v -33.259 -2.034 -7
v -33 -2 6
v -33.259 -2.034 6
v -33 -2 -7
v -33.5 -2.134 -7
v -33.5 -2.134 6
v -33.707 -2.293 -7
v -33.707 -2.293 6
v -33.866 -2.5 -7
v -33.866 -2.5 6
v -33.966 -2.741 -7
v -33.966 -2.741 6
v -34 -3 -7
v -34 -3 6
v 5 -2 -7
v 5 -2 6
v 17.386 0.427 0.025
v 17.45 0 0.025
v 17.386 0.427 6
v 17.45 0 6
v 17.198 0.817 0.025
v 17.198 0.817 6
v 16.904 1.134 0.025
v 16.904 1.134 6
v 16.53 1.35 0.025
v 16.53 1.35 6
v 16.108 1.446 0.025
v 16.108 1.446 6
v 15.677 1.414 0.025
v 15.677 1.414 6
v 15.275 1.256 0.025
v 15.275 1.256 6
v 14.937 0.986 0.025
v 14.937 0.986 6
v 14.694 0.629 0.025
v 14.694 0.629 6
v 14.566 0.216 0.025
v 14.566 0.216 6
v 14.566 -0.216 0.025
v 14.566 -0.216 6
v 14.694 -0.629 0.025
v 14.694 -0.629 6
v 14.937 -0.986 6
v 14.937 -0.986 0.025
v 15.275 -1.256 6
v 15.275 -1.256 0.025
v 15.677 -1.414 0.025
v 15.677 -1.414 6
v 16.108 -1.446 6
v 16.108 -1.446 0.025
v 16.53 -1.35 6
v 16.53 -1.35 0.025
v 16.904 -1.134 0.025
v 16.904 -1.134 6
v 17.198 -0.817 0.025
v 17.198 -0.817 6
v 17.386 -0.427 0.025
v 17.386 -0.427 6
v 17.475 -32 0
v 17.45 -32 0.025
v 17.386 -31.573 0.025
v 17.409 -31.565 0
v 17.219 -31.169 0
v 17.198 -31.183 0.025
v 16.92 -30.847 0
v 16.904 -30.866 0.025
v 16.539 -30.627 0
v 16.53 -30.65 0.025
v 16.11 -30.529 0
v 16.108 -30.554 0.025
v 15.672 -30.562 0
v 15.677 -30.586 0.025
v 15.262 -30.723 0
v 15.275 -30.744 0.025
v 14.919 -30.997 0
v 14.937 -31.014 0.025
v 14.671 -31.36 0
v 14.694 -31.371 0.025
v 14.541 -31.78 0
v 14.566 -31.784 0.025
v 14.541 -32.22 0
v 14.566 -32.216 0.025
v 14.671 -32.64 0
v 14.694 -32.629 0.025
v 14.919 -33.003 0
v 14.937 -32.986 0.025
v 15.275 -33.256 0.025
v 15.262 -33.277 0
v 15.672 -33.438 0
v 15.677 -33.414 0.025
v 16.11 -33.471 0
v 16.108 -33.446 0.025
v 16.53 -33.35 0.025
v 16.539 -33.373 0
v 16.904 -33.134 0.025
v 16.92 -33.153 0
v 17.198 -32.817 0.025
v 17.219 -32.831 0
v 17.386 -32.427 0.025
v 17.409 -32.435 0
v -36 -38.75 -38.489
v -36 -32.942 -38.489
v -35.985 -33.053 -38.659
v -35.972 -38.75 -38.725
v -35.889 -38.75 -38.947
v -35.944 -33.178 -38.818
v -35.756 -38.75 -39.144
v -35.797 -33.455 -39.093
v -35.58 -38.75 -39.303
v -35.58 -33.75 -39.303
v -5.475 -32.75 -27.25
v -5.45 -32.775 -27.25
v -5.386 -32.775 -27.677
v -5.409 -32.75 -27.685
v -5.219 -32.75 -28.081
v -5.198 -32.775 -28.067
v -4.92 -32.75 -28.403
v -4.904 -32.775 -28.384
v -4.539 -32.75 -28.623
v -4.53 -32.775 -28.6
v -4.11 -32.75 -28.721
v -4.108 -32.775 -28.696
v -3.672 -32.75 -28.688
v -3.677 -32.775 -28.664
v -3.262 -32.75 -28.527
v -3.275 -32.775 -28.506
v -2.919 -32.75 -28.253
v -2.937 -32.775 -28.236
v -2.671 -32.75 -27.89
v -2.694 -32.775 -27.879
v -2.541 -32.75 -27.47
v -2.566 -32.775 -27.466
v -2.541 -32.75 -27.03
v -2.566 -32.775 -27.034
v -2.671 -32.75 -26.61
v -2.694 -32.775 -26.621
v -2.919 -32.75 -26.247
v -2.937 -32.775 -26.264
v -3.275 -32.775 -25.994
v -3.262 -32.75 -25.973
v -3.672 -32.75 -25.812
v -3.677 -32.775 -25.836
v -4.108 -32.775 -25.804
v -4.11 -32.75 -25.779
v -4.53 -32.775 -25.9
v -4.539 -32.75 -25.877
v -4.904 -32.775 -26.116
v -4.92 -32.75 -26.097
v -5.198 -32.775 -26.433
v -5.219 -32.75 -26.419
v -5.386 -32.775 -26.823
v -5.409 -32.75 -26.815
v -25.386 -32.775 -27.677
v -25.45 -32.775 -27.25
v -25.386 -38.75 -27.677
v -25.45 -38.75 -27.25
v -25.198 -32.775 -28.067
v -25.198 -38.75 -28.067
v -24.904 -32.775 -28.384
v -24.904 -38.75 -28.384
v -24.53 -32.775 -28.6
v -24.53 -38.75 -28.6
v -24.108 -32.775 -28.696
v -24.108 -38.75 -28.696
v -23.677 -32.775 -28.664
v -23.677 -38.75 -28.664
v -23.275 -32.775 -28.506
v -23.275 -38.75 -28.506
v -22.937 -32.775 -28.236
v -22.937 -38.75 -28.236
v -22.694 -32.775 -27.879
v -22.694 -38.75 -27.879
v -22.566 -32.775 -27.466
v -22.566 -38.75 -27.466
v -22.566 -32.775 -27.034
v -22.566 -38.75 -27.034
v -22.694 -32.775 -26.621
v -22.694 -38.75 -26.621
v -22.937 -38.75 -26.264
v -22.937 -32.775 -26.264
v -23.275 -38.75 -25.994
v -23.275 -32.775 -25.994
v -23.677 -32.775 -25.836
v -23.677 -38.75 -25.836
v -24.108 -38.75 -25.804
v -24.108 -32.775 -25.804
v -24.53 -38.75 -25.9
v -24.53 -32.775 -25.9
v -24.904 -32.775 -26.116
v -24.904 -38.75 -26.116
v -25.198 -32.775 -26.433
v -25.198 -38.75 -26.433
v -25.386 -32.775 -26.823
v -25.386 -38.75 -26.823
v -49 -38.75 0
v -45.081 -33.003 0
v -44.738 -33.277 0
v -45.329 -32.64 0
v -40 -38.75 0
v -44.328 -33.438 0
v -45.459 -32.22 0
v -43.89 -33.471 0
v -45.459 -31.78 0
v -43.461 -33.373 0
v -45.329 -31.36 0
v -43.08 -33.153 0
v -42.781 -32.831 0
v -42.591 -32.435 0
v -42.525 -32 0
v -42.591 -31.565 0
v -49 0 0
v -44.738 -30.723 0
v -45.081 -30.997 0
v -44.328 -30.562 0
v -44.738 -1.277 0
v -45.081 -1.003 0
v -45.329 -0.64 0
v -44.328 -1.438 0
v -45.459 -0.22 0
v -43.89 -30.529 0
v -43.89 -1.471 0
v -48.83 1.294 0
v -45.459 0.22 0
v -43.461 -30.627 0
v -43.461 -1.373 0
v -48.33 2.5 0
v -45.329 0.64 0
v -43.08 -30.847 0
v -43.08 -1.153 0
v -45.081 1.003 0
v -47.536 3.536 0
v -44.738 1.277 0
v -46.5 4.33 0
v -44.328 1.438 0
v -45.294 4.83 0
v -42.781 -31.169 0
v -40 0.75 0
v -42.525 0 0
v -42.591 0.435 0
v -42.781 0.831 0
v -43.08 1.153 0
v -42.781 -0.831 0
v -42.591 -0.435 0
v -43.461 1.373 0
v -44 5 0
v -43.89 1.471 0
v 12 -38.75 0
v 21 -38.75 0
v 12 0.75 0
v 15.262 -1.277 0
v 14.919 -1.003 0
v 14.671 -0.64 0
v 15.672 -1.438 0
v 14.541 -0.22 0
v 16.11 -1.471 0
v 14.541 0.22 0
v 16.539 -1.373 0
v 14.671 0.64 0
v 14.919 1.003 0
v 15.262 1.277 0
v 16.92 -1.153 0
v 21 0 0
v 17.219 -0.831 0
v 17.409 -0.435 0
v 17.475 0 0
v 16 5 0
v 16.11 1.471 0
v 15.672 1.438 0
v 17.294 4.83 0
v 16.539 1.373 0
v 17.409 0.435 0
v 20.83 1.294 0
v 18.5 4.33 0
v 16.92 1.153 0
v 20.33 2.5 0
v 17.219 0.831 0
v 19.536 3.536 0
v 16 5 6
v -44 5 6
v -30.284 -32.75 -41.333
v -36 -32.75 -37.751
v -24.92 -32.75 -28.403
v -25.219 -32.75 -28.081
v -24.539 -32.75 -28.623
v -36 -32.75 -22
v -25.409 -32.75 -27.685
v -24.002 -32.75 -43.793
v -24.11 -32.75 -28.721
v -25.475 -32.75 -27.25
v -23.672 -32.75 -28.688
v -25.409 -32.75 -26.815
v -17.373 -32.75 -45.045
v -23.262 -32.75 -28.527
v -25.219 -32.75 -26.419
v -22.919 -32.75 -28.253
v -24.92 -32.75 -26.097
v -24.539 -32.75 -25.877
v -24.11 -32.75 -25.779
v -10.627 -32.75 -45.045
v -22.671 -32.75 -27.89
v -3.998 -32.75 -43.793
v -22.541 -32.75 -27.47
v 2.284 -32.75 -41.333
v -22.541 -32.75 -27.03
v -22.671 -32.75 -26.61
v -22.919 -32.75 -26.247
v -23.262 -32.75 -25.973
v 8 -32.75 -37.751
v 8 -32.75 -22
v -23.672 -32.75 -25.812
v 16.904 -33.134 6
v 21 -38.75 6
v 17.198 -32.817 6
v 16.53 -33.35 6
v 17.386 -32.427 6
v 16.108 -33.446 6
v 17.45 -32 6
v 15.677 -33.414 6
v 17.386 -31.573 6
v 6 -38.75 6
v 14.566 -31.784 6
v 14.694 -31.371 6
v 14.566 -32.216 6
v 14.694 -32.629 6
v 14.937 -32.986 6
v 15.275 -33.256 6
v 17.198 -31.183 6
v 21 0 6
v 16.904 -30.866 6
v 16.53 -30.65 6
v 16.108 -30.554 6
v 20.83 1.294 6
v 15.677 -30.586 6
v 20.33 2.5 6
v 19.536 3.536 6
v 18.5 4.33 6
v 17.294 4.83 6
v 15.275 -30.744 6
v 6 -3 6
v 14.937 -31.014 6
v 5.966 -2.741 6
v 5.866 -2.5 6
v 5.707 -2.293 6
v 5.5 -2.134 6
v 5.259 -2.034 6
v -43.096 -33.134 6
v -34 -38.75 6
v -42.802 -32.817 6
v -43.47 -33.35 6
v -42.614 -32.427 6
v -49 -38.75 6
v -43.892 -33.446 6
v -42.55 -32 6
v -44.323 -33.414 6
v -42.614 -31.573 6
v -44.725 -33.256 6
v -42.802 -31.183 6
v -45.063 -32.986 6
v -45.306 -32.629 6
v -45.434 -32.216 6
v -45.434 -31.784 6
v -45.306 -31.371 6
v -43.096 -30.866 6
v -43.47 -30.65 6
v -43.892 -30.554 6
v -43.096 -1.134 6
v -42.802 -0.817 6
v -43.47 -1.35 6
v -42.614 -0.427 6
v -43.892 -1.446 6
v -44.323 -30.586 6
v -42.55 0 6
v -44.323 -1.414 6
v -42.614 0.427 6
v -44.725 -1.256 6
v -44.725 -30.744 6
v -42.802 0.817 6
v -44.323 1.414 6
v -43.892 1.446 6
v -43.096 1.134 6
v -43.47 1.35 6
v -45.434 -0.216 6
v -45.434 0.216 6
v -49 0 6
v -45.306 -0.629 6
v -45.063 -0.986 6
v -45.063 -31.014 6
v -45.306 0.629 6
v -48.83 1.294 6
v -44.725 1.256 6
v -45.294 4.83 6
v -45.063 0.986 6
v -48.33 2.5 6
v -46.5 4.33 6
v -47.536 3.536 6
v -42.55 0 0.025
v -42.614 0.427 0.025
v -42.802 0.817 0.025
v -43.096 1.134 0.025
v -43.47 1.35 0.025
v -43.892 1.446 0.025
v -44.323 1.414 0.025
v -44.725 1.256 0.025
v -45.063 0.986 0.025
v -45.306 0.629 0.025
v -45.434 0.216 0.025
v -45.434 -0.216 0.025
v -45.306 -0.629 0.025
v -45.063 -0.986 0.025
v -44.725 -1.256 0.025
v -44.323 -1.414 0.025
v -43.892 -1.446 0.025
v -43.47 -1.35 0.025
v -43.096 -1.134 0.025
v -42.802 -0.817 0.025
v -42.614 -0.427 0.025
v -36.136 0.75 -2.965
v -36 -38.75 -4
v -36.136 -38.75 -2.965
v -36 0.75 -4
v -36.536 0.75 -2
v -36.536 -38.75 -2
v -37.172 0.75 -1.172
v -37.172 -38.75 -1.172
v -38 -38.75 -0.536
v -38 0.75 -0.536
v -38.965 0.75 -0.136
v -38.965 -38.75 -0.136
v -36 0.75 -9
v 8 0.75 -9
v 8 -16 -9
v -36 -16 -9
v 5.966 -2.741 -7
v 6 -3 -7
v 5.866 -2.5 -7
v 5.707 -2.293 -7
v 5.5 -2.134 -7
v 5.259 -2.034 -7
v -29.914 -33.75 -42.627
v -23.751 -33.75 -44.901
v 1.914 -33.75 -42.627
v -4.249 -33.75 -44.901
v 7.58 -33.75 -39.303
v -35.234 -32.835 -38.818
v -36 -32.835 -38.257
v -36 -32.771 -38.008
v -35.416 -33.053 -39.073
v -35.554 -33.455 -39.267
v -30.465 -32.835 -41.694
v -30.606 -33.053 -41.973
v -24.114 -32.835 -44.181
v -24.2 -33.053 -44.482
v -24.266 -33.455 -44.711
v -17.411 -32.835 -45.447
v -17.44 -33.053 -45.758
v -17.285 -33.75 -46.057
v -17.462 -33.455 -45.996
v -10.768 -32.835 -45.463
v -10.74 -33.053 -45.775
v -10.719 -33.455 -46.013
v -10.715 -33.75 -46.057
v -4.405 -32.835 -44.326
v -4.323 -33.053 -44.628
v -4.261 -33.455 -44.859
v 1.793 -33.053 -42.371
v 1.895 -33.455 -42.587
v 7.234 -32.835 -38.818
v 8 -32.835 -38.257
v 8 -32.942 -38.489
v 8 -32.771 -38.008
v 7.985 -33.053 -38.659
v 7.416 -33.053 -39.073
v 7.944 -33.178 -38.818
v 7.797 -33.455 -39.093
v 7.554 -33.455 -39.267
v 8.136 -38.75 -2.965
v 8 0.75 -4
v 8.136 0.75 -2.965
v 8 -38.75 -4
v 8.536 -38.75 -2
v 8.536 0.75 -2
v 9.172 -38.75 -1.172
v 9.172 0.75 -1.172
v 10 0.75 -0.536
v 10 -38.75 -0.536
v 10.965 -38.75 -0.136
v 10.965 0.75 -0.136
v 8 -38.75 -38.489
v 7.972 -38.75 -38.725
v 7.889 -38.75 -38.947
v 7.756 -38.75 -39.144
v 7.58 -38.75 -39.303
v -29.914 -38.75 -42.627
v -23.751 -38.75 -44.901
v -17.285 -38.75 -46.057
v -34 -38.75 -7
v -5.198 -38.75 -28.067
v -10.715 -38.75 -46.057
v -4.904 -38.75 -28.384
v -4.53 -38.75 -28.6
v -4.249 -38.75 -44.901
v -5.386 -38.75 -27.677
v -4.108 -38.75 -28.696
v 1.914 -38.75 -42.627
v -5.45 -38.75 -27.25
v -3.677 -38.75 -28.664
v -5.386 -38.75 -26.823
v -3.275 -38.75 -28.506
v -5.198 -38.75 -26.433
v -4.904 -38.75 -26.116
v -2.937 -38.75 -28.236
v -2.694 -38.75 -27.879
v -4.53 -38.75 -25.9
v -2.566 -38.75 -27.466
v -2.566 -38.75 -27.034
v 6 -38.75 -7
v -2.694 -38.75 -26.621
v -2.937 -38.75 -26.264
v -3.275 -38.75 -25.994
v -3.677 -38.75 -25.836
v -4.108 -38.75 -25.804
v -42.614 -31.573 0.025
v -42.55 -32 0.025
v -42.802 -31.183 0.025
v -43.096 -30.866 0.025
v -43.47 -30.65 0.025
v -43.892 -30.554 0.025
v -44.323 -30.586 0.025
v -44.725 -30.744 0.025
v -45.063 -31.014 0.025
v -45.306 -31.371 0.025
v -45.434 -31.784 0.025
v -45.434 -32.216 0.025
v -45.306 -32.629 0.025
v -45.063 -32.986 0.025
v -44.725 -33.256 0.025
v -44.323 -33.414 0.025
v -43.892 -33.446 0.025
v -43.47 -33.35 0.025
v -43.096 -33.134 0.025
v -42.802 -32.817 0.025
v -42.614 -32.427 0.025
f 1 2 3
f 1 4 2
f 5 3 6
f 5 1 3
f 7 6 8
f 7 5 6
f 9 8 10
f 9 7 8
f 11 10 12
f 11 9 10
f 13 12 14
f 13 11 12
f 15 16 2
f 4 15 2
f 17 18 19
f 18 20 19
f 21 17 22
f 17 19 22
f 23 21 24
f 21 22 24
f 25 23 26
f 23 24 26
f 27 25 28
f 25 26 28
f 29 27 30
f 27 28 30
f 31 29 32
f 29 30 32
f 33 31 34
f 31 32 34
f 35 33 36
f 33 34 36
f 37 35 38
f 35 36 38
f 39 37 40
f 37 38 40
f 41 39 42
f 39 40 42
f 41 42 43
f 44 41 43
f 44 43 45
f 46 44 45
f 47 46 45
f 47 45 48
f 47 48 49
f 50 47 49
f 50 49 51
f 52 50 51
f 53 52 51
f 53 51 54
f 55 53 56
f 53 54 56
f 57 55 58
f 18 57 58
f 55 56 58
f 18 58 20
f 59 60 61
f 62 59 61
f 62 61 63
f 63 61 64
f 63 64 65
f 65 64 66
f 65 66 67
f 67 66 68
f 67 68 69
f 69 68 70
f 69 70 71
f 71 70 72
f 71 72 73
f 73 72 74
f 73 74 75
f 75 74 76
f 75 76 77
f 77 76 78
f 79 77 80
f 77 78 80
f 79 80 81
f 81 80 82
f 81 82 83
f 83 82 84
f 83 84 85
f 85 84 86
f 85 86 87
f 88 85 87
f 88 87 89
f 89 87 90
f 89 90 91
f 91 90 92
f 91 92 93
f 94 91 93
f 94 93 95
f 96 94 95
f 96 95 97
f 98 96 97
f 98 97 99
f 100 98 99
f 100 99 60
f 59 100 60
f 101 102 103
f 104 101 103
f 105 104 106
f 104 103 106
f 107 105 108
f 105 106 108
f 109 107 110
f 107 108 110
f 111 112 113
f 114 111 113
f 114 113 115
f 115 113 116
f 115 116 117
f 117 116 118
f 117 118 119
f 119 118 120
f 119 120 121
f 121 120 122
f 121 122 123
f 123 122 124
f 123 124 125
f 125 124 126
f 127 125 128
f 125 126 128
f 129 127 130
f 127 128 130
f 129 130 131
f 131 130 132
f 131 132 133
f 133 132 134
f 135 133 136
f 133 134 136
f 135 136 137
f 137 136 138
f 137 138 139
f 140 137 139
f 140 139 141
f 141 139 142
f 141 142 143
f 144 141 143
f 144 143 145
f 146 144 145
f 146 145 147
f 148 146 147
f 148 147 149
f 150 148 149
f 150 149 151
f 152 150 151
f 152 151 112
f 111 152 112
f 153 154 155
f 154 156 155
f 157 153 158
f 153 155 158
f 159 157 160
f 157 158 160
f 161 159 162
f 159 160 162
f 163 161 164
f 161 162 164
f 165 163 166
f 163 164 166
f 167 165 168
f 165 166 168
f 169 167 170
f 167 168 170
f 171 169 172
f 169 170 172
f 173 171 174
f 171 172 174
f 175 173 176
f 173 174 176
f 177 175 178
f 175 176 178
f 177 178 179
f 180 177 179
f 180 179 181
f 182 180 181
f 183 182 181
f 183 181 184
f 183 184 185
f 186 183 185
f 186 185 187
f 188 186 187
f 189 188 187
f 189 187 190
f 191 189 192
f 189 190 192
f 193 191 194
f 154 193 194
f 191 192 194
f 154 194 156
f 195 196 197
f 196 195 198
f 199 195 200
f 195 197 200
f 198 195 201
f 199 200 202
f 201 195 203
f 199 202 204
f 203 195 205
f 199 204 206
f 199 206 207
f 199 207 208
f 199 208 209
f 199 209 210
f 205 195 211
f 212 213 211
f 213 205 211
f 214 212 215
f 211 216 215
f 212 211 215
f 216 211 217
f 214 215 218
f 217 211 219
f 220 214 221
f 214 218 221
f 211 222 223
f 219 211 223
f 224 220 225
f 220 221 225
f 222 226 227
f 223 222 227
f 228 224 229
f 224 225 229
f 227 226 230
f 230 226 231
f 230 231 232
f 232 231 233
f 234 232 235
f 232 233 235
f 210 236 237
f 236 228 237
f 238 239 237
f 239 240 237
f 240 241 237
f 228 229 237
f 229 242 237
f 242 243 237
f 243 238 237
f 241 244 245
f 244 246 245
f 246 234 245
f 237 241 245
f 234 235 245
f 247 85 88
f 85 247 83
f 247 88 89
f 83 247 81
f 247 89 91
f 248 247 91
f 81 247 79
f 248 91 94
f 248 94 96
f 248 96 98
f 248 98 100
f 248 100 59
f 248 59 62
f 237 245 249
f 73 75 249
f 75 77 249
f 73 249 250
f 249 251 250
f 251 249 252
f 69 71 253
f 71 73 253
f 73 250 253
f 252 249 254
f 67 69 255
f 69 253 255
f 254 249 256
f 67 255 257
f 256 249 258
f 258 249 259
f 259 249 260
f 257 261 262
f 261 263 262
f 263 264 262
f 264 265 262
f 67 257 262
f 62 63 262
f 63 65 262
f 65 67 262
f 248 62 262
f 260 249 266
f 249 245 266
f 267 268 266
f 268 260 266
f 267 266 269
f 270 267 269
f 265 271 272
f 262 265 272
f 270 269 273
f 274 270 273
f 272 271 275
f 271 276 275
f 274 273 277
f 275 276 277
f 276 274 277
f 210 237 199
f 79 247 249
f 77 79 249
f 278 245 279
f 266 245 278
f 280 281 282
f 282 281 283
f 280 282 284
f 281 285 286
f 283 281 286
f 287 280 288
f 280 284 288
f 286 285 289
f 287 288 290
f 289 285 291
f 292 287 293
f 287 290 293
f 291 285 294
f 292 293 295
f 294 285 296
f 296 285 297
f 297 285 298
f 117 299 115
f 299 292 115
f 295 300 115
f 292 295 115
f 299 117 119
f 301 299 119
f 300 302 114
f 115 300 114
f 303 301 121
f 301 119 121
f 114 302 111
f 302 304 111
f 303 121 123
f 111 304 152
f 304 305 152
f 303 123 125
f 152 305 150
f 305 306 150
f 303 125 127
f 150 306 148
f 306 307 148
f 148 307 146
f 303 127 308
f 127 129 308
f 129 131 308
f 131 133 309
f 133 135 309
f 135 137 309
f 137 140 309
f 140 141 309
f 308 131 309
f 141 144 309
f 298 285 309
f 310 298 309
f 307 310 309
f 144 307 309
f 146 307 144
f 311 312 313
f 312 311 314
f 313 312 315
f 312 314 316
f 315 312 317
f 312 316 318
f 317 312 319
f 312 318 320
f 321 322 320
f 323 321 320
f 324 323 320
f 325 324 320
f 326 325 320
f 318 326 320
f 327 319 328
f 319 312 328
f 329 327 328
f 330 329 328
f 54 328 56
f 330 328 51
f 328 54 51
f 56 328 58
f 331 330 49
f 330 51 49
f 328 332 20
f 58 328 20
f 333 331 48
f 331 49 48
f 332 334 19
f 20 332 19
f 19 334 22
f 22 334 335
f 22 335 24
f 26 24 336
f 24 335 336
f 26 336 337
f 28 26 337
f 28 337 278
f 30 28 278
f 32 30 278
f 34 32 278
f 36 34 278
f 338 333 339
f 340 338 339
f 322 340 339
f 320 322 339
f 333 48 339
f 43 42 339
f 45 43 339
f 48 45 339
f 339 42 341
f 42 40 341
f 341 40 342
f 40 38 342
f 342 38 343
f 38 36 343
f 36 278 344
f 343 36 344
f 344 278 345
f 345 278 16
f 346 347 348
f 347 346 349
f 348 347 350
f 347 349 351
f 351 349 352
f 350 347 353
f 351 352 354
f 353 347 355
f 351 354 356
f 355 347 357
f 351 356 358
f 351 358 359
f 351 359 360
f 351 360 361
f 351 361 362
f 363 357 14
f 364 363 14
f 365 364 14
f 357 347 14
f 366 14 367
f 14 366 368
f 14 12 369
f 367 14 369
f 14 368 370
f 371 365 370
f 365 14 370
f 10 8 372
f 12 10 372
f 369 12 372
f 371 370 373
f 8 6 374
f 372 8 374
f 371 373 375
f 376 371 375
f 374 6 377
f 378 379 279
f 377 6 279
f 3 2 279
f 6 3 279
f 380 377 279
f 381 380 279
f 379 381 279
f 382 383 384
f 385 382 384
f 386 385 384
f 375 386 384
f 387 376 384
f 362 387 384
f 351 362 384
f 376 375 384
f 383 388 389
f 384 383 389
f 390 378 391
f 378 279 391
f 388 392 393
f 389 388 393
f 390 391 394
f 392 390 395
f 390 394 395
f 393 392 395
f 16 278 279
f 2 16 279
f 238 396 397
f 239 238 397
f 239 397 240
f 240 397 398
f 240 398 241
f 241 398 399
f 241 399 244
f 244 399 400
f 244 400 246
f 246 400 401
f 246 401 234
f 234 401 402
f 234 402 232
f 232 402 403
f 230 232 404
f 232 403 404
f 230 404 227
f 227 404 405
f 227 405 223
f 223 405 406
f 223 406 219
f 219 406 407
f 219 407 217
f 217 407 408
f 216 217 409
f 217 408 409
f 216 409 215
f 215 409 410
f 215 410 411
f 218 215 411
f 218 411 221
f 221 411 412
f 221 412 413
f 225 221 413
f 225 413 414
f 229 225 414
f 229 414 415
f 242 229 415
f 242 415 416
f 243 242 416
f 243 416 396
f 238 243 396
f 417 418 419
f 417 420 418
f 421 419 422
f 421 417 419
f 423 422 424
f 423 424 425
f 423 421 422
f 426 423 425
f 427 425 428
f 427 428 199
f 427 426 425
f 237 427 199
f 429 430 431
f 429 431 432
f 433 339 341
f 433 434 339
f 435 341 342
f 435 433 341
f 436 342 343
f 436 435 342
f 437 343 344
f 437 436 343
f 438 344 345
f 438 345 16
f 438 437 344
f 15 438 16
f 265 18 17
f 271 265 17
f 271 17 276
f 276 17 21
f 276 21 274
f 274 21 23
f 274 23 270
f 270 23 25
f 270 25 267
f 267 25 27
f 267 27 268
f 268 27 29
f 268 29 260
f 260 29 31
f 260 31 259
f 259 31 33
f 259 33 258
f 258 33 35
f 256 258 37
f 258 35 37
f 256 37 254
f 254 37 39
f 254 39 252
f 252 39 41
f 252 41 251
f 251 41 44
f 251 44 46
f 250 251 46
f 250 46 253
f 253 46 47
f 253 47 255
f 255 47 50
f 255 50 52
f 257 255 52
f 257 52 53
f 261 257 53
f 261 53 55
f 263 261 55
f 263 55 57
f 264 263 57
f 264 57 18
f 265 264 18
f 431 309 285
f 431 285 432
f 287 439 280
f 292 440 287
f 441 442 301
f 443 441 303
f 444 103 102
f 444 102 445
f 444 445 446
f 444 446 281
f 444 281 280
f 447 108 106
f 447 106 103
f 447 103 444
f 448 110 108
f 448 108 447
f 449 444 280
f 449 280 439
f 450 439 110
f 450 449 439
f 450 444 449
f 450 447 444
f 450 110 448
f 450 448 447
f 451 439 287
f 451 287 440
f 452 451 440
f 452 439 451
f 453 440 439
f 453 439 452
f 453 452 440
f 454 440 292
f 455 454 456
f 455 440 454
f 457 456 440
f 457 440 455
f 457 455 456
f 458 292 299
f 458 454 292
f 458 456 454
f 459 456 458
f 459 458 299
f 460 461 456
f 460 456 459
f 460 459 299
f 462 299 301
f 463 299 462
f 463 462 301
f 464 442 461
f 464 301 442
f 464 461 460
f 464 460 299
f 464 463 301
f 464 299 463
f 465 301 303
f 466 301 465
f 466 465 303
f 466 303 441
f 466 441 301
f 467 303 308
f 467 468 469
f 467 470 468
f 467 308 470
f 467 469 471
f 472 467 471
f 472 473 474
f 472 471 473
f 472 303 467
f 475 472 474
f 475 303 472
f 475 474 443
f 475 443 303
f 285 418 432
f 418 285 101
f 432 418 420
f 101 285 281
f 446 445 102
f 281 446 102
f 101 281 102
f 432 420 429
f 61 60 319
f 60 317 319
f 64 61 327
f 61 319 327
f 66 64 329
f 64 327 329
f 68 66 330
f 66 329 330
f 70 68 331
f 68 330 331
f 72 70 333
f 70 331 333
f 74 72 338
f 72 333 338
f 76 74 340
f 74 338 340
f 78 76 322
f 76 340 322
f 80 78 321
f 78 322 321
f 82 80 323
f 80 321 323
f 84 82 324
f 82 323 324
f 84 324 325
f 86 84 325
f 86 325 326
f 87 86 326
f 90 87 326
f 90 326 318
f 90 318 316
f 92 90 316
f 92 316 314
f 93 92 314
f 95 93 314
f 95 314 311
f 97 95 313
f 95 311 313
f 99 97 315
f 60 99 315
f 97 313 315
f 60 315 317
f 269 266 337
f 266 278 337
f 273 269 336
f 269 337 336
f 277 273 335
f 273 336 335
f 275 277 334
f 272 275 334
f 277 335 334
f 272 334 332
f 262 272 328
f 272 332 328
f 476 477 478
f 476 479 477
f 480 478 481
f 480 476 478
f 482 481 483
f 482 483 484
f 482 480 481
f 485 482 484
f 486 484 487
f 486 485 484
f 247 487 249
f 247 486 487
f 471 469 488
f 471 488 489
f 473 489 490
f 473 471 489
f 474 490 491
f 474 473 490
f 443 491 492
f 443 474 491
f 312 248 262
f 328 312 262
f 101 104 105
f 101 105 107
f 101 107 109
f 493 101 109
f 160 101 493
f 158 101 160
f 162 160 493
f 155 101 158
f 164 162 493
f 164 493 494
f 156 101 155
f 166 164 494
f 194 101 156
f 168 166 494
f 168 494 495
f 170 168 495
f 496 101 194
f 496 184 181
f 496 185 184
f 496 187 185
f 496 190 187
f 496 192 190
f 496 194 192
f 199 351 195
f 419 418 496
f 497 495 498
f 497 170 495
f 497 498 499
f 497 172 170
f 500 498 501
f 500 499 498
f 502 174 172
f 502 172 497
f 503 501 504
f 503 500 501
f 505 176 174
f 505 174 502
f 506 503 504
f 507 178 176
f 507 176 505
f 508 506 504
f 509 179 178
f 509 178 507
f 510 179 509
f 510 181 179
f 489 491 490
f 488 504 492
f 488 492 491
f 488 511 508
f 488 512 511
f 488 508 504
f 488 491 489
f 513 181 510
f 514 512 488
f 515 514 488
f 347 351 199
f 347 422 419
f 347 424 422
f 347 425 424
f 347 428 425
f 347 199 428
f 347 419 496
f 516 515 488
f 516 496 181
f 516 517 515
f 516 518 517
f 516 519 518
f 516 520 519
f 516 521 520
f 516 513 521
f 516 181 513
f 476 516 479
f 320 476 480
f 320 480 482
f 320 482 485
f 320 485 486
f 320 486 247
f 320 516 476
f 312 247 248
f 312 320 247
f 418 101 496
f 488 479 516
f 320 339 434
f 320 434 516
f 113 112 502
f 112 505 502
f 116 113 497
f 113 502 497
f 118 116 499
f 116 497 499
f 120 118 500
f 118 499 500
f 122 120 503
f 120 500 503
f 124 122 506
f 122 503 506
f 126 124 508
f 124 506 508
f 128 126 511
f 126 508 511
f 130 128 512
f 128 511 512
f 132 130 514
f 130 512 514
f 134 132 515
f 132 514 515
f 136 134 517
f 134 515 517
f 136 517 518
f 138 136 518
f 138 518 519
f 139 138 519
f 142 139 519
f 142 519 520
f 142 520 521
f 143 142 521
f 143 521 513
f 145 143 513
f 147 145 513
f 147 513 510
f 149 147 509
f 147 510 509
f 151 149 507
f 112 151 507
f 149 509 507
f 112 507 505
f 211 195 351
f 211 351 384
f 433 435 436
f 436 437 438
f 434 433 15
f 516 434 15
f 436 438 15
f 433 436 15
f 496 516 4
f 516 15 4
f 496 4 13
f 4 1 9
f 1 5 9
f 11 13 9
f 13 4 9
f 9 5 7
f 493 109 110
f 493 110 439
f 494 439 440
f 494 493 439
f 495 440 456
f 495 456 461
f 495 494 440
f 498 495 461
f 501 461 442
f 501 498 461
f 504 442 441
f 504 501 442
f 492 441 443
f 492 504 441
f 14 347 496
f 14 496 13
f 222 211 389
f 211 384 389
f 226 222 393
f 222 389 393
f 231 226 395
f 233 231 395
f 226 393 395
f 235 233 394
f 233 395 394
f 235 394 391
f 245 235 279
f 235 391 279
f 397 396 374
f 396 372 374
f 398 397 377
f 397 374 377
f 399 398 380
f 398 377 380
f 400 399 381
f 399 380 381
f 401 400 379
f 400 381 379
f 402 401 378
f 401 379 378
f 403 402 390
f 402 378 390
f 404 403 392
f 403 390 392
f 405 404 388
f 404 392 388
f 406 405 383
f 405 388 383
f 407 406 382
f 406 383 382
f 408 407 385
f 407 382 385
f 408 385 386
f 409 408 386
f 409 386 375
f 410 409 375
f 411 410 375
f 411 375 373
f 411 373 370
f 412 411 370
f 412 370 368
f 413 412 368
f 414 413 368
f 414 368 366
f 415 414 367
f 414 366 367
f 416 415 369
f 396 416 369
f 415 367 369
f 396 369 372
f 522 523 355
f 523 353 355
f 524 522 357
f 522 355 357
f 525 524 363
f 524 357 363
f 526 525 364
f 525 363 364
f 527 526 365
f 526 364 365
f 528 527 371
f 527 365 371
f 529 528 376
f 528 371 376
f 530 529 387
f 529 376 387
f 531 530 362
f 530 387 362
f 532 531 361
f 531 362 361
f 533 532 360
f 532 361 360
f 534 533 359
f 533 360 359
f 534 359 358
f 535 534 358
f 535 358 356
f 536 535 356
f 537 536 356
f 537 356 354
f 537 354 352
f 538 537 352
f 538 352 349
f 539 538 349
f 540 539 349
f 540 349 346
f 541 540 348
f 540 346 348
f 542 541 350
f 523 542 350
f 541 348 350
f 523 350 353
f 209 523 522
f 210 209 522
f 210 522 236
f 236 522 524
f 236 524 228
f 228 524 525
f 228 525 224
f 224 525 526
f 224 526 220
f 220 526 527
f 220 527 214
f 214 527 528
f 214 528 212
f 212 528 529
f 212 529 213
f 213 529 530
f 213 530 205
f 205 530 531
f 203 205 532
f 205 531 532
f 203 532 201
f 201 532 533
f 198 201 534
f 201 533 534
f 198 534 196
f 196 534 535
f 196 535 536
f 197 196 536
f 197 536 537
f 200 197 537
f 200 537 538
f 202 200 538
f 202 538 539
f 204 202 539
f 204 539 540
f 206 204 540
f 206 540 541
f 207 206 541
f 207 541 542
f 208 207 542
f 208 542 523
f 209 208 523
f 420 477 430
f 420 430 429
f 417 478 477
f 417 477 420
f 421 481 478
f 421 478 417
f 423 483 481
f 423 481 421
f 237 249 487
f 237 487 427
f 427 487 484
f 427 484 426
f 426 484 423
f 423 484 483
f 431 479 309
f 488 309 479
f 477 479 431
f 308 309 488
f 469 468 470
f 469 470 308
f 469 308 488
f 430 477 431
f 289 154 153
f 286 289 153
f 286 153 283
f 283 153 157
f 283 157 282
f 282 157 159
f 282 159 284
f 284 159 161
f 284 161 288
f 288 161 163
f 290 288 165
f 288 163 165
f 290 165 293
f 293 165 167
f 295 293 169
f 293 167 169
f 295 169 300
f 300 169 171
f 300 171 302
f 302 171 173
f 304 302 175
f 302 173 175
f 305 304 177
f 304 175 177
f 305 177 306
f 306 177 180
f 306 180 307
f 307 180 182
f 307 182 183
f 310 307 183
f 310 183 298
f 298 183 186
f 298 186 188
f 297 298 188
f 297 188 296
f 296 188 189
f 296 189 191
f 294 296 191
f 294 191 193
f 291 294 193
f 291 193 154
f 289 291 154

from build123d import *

# Parameters (mm, degrees)
SKETCH_1_W                     = 70
SKETCH_1_H                     = 43.75
EXTRUDE_1_DEPTH                = 6
EXTRUDE_2_DEPTH                = 15
CUT_EXTRUDE_1_DEPTH            = 13
EXTRUDE_4_DEPTH                = 6
EXTRUDE_5_DEPTH                = 44
FILLET_3_R                     = 1
FILLET_5_R                     = 4
FILLET_6_R                     = 1
FILLET_7_R                     = 5
HOLE_WIZARD_M2_5_1_D           = 2.9
HOLE_WIZARD_M2_5_1_CSINK_D     = 2.95
HOLE_WIZARD_M2_5_1_CSINK_ANGLE = 90
HOLE_WIZARD_M2_5_3_D           = 2.9
HOLE_WIZARD_M2_5_3_CSINK_D     = 2.95
HOLE_WIZARD_M2_5_3_CSINK_ANGLE = 90


with BuildPart() as part:
    # 草图1 → 凸台-拉伸1 (new body)
    with BuildSketch(Plane.XY):
        with Locations((-14, -16.875)):
            Rectangle(SKETCH_1_W, SKETCH_1_H)
    extrude(amount=EXTRUDE_1_DEPTH)

    # 草图2 → 凸台-拉伸2 (add)
    with BuildSketch(Plane.XY.offset(6)):
        Polygon((-13.907811237, 0.75), (8, 0.75), (8, -38.75), (-36, -38.75), (-36, 0.75), align=None)
    extrude(amount=-EXTRUDE_2_DEPTH)

    # 草图3 → 切除-拉伸1 (cut)
    with BuildSketch(Plane.XY.offset(6)):
        Polygon((-14, -2), (6, -2), (6, -38.75), (-34, -38.75), (-34, -2), align=None)
    extrude(amount=-CUT_EXTRUDE_1_DEPTH, mode=Mode.SUBTRACT)

    # 草图5 → 凸台-拉伸4 (add)
    with BuildSketch(Plane.XZ.offset(38.75)):
        with BuildLine():
            Line((-36, -9), (-36, -39))
            ThreePointArc((-36, -39), (-14, -46.202150475), (8, -39))
            Line((8, -39), (8, -9))
            Line((8, -9), (-36, -9))
        make_face()
    extrude(amount=-EXTRUDE_4_DEPTH)

    # 草图12 → 凸台-拉伸5 (add)
    with BuildSketch(Plane(origin=(8, 0, 0), x_dir=(0, 0, -1), z_dir=(1, 0, 0))):
        Polygon((9, -32.75), (22, -32.75), (9, -16), align=None)
    extrude(amount=-EXTRUDE_5_DEPTH)

    # 圆角3
    fillet_3_edges = [part.edges().sort_by_distance(p)[0] for p in [
        (-36, -35.75, -39),
        (-14, -32.75, -46.202150475),
        (8, -35.75, -39),
    ]]
    fillet(fillet_3_edges, radius=FILLET_3_R)

    # 圆角5
    fillet_5_edges = [part.edges().sort_by_distance(p)[0] for p in [
        (8, -19, 0),
        (-36, -19, 0),
    ]]
    fillet(fillet_5_edges, radius=FILLET_5_R)

    # 圆角6
    fillet_6_edges = [part.edges().sort_by_distance(p)[0] for p in [
        (6, -2, -0.5),
        (-34, -2, -0.5),
    ]]
    fillet(fillet_6_edges, radius=FILLET_6_R)

    # 圆角7
    fillet_7_edges = [part.edges().sort_by_distance(p)[0] for p in [
        (-49, 5, 3),
        (21, 5, 3),
    ]]
    fillet(fillet_7_edges, radius=FILLET_7_R)

    # M2.5 间隙孔1 (through all)
    with Locations(Plane(origin=(0, 0, 0), x_dir=(-1, 0, 0), z_dir=(0, 0, -1))):
        with Locations((-16, 0), (-16, -32), (44, -32), (44, 0)):
            CounterSinkHole(HOLE_WIZARD_M2_5_1_D / 2, HOLE_WIZARD_M2_5_1_CSINK_D / 2, counter_sink_angle=HOLE_WIZARD_M2_5_1_CSINK_ANGLE)

    # M2.5 间隙孔3 (through all)
    with Locations(Plane(origin=(0, -32.75, 0), x_dir=(1, 0, 0), z_dir=(0, 1, 0))):
        with Locations((-24, 27.25), (-4, 27.25)):
            CounterSinkHole(HOLE_WIZARD_M2_5_3_D / 2, HOLE_WIZARD_M2_5_3_CSINK_D / 2, counter_sink_angle=HOLE_WIZARD_M2_5_3_CSINK_ANGLE)


solid = part.part
